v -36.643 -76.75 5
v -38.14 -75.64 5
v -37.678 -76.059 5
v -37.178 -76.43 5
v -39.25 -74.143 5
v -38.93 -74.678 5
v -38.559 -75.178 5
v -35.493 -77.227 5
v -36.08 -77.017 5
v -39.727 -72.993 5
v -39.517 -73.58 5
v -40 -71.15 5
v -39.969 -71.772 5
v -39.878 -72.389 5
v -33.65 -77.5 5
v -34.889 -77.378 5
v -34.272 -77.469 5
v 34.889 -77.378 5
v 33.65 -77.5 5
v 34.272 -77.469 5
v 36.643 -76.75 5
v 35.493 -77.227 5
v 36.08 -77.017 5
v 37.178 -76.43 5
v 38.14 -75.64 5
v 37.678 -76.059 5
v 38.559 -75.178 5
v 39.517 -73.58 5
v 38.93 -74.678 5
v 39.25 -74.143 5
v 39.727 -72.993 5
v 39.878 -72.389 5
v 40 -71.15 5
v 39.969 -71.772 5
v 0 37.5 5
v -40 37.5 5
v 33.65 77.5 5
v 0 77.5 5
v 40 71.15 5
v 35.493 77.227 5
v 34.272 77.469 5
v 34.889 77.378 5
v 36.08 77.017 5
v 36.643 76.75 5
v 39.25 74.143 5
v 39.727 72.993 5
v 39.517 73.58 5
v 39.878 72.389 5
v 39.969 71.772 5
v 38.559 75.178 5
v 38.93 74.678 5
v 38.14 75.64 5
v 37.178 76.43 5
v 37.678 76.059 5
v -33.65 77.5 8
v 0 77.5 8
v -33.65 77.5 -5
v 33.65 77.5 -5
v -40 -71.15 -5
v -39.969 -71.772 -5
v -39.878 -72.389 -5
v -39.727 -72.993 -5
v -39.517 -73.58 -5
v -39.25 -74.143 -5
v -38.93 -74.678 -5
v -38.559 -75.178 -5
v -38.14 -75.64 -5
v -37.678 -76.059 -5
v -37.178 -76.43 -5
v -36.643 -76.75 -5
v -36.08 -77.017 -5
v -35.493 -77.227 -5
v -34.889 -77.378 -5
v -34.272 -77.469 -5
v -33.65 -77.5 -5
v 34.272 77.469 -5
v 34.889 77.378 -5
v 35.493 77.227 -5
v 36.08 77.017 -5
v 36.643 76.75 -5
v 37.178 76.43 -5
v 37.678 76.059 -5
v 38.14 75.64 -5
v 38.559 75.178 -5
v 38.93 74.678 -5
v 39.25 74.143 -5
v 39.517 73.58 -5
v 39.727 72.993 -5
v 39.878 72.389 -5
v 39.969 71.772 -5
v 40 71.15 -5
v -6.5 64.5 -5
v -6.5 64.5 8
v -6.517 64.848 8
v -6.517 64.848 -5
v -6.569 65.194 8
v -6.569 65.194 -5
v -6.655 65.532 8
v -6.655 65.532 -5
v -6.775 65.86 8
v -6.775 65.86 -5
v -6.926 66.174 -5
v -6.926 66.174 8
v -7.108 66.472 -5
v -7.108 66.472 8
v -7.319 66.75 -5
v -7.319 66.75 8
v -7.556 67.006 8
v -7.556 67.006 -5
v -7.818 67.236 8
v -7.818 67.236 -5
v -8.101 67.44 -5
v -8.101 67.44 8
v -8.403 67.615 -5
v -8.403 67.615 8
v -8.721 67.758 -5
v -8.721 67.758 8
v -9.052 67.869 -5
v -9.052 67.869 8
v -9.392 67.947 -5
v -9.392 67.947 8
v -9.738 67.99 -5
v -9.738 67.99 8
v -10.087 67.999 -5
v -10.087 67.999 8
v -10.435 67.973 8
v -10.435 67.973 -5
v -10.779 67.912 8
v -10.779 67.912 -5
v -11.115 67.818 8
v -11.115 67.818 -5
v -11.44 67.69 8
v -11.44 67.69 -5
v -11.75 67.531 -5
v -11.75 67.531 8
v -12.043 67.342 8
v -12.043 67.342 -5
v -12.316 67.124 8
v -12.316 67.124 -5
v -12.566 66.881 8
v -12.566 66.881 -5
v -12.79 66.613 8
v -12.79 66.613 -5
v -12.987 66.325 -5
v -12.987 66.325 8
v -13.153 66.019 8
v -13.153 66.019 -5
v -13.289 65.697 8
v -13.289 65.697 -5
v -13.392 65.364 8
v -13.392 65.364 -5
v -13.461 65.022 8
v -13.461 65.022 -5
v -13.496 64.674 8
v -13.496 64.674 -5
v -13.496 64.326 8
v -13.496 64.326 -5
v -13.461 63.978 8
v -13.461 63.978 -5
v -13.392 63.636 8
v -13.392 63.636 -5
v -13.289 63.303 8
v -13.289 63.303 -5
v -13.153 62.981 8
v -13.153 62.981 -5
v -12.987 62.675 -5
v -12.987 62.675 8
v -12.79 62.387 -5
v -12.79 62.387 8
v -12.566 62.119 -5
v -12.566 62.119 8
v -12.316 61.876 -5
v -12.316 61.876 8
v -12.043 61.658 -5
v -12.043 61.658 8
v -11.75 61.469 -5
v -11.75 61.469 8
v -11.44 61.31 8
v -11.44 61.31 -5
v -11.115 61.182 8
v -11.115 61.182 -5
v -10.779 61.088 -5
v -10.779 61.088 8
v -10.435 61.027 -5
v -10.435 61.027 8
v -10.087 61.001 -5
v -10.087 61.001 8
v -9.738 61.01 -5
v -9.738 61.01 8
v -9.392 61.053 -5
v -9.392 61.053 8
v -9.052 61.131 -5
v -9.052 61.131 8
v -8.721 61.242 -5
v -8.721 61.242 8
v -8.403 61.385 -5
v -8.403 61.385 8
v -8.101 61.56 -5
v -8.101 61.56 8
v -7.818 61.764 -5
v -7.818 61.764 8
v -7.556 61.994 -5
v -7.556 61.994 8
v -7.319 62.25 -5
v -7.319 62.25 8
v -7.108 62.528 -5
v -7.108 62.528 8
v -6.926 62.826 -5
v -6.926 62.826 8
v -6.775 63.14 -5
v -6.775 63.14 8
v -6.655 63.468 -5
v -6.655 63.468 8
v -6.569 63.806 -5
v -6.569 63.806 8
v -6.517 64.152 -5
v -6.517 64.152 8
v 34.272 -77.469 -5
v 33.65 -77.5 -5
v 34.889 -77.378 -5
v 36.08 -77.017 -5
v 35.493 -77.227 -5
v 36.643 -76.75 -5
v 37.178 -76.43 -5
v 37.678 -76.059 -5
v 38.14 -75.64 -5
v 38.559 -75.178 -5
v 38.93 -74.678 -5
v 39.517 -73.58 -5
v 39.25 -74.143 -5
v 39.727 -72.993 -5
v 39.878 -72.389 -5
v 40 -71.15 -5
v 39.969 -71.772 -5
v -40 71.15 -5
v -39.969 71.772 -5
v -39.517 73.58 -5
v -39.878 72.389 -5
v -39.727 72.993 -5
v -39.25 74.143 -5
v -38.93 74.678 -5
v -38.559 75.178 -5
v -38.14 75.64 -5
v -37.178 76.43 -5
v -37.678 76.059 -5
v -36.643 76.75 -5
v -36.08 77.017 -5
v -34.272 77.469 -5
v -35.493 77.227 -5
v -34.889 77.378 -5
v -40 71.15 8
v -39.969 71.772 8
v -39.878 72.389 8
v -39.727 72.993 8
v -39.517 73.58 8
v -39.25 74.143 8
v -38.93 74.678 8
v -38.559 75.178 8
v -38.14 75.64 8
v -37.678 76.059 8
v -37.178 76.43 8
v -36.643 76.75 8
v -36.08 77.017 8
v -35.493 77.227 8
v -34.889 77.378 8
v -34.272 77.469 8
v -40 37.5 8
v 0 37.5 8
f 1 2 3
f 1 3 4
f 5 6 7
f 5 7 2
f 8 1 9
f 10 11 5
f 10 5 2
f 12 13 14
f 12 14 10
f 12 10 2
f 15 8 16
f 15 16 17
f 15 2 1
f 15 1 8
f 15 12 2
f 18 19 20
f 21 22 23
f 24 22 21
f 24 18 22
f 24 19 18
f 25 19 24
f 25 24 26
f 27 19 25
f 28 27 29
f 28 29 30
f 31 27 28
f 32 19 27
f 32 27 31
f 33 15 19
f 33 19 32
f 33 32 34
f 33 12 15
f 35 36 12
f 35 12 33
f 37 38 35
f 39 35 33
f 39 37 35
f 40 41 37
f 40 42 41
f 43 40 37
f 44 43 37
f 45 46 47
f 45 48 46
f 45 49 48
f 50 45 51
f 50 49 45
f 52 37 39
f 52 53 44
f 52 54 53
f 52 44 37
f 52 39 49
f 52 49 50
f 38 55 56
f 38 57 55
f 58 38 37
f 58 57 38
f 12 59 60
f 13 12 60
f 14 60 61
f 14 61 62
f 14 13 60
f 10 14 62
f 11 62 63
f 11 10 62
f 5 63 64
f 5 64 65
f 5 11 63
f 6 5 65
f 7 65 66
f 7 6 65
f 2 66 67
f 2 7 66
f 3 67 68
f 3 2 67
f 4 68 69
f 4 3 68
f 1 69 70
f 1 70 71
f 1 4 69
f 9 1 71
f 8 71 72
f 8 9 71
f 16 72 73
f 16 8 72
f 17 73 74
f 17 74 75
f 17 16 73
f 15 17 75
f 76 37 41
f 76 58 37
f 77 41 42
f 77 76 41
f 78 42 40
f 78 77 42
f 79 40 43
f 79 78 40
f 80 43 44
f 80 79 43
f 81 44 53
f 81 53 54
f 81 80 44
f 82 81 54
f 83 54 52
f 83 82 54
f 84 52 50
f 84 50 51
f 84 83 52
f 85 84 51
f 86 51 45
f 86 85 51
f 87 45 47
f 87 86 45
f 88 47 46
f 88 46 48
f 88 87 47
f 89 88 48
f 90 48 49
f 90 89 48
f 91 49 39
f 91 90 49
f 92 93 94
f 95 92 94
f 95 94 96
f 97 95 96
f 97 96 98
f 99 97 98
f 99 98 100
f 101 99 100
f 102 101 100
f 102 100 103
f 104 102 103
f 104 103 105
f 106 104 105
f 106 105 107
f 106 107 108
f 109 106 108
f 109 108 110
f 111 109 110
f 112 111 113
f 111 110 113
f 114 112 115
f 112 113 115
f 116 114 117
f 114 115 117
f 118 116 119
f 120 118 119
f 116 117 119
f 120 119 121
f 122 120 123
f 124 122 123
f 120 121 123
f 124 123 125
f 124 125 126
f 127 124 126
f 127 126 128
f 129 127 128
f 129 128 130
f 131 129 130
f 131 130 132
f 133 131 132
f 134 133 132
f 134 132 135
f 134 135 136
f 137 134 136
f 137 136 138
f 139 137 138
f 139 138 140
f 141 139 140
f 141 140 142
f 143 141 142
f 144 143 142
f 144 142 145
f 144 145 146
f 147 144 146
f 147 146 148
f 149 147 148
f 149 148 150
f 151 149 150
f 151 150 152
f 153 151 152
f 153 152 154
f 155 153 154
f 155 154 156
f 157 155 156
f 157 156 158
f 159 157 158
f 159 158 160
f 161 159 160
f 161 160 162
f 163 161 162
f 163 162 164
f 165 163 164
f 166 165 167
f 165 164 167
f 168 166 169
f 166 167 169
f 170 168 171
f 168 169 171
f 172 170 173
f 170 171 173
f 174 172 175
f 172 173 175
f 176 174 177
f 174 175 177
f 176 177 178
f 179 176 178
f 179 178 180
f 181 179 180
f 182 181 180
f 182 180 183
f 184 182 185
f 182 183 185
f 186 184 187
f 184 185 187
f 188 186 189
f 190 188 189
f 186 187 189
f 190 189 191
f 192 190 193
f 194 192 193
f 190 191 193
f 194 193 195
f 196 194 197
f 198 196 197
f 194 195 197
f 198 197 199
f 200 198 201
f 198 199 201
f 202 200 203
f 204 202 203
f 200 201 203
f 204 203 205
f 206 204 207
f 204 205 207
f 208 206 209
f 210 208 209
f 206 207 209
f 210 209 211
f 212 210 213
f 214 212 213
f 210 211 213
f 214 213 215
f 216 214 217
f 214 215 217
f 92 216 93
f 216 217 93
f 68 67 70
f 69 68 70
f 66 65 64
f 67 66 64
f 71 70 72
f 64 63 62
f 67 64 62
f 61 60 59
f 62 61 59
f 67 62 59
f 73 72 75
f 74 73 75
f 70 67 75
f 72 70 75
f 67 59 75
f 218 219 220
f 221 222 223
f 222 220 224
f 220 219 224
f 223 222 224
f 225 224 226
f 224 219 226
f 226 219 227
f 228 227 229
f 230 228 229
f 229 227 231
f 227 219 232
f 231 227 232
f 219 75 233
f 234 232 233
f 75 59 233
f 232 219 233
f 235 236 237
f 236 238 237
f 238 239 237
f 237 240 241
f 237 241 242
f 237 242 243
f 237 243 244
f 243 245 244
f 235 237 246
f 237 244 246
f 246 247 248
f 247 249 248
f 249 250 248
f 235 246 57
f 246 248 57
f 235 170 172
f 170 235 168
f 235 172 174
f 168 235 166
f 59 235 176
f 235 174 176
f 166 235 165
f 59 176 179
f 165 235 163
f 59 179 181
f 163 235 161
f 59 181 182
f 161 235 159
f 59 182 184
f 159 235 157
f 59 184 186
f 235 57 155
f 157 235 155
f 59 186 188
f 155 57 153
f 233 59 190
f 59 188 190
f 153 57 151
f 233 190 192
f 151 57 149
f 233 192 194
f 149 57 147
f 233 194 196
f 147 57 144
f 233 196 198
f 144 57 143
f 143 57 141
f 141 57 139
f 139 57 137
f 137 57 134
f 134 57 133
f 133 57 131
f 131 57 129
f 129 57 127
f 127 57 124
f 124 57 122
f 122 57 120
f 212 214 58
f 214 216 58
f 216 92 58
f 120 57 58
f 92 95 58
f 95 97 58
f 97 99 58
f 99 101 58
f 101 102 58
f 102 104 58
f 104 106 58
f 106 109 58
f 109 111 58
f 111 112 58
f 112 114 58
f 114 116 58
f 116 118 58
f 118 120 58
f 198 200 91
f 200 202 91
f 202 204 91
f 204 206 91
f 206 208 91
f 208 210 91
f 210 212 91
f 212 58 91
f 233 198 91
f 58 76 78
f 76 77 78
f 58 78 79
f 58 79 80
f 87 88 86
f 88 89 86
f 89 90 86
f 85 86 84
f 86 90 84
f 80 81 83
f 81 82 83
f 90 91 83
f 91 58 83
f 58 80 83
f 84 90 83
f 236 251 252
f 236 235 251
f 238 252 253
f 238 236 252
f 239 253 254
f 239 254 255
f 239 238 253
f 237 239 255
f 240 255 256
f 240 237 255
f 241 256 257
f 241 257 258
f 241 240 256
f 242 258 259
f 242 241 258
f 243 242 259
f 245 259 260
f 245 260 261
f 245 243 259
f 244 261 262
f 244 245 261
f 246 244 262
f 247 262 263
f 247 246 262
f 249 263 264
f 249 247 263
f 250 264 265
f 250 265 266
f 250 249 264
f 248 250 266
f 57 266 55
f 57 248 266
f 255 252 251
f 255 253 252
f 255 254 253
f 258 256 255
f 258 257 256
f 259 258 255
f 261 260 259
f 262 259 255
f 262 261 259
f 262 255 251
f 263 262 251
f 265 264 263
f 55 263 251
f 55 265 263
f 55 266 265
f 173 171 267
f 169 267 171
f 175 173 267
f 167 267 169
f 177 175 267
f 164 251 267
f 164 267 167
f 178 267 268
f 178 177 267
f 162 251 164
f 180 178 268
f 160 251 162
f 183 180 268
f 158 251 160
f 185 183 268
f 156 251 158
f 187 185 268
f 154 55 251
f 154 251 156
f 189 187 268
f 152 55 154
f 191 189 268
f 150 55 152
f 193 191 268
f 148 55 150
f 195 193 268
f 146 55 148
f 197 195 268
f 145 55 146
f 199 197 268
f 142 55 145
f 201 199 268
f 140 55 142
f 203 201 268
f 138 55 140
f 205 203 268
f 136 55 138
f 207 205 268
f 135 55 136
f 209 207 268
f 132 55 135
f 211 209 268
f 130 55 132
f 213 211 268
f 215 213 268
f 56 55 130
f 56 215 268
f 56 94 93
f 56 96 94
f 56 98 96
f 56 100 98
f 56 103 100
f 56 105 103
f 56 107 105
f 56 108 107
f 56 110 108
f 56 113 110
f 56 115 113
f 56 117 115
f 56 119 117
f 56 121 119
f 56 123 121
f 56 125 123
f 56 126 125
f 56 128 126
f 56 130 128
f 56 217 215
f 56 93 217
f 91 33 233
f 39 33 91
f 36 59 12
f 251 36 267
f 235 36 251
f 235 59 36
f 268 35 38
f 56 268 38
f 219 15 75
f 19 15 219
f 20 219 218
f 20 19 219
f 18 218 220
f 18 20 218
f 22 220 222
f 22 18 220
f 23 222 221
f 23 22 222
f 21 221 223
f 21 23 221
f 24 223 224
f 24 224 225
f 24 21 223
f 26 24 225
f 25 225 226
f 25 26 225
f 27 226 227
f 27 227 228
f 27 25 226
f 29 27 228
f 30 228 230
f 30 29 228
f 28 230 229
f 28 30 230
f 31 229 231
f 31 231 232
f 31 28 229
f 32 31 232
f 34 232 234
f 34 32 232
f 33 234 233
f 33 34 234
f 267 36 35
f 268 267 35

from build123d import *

# Parameters (mm, degrees)
SKETCH1_W           = 80
SKETCH1_H           = 155
BOSS_EXTRUDE1_DEPTH = 5
SKETCH2_W           = 40
SKETCH2_H           = 40
BOSS_EXTRUDE2_DEPTH = 3
SKETCH3_R           = 3.5
CUT_EXTRUDE1_DEPTH  = 89.177378051
FILLET1_R           = 6.35


with BuildPart() as part:
    # Sketch1 → Boss-Extrude1 (new, symmetric)
    with BuildSketch(Plane.XY):
        Rectangle(SKETCH1_W, SKETCH1_H)
    extrude(amount=BOSS_EXTRUDE1_DEPTH, both=True)

    # Sketch2 → Boss-Extrude2 (add)
    with BuildSketch(Plane.XY.offset(5)):
        with Locations((-20, 57.5)):
            Rectangle(SKETCH2_W, SKETCH2_H)
    extrude(amount=BOSS_EXTRUDE2_DEPTH)

    # Sketch3 → Cut-Extrude1 (cut, through all)
    with BuildSketch(Plane.XY.offset(8)):
        with Locations((-10, 64.5)):
            Circle(SKETCH3_R)
    extrude(amount=-CUT_EXTRUDE1_DEPTH, mode=Mode.SUBTRACT)

    # Fillet1
    fillet1_edges = [part.edges().sort_by_distance(p)[0] for p in [
        (40, -77.5, 0),
        (-40, -77.5, 0),
        (-40, 77.5, 1.5),
        (40, 77.5, 0),
    ]]
    fillet(fillet1_edges, radius=FILLET1_R)


solid = part.part
